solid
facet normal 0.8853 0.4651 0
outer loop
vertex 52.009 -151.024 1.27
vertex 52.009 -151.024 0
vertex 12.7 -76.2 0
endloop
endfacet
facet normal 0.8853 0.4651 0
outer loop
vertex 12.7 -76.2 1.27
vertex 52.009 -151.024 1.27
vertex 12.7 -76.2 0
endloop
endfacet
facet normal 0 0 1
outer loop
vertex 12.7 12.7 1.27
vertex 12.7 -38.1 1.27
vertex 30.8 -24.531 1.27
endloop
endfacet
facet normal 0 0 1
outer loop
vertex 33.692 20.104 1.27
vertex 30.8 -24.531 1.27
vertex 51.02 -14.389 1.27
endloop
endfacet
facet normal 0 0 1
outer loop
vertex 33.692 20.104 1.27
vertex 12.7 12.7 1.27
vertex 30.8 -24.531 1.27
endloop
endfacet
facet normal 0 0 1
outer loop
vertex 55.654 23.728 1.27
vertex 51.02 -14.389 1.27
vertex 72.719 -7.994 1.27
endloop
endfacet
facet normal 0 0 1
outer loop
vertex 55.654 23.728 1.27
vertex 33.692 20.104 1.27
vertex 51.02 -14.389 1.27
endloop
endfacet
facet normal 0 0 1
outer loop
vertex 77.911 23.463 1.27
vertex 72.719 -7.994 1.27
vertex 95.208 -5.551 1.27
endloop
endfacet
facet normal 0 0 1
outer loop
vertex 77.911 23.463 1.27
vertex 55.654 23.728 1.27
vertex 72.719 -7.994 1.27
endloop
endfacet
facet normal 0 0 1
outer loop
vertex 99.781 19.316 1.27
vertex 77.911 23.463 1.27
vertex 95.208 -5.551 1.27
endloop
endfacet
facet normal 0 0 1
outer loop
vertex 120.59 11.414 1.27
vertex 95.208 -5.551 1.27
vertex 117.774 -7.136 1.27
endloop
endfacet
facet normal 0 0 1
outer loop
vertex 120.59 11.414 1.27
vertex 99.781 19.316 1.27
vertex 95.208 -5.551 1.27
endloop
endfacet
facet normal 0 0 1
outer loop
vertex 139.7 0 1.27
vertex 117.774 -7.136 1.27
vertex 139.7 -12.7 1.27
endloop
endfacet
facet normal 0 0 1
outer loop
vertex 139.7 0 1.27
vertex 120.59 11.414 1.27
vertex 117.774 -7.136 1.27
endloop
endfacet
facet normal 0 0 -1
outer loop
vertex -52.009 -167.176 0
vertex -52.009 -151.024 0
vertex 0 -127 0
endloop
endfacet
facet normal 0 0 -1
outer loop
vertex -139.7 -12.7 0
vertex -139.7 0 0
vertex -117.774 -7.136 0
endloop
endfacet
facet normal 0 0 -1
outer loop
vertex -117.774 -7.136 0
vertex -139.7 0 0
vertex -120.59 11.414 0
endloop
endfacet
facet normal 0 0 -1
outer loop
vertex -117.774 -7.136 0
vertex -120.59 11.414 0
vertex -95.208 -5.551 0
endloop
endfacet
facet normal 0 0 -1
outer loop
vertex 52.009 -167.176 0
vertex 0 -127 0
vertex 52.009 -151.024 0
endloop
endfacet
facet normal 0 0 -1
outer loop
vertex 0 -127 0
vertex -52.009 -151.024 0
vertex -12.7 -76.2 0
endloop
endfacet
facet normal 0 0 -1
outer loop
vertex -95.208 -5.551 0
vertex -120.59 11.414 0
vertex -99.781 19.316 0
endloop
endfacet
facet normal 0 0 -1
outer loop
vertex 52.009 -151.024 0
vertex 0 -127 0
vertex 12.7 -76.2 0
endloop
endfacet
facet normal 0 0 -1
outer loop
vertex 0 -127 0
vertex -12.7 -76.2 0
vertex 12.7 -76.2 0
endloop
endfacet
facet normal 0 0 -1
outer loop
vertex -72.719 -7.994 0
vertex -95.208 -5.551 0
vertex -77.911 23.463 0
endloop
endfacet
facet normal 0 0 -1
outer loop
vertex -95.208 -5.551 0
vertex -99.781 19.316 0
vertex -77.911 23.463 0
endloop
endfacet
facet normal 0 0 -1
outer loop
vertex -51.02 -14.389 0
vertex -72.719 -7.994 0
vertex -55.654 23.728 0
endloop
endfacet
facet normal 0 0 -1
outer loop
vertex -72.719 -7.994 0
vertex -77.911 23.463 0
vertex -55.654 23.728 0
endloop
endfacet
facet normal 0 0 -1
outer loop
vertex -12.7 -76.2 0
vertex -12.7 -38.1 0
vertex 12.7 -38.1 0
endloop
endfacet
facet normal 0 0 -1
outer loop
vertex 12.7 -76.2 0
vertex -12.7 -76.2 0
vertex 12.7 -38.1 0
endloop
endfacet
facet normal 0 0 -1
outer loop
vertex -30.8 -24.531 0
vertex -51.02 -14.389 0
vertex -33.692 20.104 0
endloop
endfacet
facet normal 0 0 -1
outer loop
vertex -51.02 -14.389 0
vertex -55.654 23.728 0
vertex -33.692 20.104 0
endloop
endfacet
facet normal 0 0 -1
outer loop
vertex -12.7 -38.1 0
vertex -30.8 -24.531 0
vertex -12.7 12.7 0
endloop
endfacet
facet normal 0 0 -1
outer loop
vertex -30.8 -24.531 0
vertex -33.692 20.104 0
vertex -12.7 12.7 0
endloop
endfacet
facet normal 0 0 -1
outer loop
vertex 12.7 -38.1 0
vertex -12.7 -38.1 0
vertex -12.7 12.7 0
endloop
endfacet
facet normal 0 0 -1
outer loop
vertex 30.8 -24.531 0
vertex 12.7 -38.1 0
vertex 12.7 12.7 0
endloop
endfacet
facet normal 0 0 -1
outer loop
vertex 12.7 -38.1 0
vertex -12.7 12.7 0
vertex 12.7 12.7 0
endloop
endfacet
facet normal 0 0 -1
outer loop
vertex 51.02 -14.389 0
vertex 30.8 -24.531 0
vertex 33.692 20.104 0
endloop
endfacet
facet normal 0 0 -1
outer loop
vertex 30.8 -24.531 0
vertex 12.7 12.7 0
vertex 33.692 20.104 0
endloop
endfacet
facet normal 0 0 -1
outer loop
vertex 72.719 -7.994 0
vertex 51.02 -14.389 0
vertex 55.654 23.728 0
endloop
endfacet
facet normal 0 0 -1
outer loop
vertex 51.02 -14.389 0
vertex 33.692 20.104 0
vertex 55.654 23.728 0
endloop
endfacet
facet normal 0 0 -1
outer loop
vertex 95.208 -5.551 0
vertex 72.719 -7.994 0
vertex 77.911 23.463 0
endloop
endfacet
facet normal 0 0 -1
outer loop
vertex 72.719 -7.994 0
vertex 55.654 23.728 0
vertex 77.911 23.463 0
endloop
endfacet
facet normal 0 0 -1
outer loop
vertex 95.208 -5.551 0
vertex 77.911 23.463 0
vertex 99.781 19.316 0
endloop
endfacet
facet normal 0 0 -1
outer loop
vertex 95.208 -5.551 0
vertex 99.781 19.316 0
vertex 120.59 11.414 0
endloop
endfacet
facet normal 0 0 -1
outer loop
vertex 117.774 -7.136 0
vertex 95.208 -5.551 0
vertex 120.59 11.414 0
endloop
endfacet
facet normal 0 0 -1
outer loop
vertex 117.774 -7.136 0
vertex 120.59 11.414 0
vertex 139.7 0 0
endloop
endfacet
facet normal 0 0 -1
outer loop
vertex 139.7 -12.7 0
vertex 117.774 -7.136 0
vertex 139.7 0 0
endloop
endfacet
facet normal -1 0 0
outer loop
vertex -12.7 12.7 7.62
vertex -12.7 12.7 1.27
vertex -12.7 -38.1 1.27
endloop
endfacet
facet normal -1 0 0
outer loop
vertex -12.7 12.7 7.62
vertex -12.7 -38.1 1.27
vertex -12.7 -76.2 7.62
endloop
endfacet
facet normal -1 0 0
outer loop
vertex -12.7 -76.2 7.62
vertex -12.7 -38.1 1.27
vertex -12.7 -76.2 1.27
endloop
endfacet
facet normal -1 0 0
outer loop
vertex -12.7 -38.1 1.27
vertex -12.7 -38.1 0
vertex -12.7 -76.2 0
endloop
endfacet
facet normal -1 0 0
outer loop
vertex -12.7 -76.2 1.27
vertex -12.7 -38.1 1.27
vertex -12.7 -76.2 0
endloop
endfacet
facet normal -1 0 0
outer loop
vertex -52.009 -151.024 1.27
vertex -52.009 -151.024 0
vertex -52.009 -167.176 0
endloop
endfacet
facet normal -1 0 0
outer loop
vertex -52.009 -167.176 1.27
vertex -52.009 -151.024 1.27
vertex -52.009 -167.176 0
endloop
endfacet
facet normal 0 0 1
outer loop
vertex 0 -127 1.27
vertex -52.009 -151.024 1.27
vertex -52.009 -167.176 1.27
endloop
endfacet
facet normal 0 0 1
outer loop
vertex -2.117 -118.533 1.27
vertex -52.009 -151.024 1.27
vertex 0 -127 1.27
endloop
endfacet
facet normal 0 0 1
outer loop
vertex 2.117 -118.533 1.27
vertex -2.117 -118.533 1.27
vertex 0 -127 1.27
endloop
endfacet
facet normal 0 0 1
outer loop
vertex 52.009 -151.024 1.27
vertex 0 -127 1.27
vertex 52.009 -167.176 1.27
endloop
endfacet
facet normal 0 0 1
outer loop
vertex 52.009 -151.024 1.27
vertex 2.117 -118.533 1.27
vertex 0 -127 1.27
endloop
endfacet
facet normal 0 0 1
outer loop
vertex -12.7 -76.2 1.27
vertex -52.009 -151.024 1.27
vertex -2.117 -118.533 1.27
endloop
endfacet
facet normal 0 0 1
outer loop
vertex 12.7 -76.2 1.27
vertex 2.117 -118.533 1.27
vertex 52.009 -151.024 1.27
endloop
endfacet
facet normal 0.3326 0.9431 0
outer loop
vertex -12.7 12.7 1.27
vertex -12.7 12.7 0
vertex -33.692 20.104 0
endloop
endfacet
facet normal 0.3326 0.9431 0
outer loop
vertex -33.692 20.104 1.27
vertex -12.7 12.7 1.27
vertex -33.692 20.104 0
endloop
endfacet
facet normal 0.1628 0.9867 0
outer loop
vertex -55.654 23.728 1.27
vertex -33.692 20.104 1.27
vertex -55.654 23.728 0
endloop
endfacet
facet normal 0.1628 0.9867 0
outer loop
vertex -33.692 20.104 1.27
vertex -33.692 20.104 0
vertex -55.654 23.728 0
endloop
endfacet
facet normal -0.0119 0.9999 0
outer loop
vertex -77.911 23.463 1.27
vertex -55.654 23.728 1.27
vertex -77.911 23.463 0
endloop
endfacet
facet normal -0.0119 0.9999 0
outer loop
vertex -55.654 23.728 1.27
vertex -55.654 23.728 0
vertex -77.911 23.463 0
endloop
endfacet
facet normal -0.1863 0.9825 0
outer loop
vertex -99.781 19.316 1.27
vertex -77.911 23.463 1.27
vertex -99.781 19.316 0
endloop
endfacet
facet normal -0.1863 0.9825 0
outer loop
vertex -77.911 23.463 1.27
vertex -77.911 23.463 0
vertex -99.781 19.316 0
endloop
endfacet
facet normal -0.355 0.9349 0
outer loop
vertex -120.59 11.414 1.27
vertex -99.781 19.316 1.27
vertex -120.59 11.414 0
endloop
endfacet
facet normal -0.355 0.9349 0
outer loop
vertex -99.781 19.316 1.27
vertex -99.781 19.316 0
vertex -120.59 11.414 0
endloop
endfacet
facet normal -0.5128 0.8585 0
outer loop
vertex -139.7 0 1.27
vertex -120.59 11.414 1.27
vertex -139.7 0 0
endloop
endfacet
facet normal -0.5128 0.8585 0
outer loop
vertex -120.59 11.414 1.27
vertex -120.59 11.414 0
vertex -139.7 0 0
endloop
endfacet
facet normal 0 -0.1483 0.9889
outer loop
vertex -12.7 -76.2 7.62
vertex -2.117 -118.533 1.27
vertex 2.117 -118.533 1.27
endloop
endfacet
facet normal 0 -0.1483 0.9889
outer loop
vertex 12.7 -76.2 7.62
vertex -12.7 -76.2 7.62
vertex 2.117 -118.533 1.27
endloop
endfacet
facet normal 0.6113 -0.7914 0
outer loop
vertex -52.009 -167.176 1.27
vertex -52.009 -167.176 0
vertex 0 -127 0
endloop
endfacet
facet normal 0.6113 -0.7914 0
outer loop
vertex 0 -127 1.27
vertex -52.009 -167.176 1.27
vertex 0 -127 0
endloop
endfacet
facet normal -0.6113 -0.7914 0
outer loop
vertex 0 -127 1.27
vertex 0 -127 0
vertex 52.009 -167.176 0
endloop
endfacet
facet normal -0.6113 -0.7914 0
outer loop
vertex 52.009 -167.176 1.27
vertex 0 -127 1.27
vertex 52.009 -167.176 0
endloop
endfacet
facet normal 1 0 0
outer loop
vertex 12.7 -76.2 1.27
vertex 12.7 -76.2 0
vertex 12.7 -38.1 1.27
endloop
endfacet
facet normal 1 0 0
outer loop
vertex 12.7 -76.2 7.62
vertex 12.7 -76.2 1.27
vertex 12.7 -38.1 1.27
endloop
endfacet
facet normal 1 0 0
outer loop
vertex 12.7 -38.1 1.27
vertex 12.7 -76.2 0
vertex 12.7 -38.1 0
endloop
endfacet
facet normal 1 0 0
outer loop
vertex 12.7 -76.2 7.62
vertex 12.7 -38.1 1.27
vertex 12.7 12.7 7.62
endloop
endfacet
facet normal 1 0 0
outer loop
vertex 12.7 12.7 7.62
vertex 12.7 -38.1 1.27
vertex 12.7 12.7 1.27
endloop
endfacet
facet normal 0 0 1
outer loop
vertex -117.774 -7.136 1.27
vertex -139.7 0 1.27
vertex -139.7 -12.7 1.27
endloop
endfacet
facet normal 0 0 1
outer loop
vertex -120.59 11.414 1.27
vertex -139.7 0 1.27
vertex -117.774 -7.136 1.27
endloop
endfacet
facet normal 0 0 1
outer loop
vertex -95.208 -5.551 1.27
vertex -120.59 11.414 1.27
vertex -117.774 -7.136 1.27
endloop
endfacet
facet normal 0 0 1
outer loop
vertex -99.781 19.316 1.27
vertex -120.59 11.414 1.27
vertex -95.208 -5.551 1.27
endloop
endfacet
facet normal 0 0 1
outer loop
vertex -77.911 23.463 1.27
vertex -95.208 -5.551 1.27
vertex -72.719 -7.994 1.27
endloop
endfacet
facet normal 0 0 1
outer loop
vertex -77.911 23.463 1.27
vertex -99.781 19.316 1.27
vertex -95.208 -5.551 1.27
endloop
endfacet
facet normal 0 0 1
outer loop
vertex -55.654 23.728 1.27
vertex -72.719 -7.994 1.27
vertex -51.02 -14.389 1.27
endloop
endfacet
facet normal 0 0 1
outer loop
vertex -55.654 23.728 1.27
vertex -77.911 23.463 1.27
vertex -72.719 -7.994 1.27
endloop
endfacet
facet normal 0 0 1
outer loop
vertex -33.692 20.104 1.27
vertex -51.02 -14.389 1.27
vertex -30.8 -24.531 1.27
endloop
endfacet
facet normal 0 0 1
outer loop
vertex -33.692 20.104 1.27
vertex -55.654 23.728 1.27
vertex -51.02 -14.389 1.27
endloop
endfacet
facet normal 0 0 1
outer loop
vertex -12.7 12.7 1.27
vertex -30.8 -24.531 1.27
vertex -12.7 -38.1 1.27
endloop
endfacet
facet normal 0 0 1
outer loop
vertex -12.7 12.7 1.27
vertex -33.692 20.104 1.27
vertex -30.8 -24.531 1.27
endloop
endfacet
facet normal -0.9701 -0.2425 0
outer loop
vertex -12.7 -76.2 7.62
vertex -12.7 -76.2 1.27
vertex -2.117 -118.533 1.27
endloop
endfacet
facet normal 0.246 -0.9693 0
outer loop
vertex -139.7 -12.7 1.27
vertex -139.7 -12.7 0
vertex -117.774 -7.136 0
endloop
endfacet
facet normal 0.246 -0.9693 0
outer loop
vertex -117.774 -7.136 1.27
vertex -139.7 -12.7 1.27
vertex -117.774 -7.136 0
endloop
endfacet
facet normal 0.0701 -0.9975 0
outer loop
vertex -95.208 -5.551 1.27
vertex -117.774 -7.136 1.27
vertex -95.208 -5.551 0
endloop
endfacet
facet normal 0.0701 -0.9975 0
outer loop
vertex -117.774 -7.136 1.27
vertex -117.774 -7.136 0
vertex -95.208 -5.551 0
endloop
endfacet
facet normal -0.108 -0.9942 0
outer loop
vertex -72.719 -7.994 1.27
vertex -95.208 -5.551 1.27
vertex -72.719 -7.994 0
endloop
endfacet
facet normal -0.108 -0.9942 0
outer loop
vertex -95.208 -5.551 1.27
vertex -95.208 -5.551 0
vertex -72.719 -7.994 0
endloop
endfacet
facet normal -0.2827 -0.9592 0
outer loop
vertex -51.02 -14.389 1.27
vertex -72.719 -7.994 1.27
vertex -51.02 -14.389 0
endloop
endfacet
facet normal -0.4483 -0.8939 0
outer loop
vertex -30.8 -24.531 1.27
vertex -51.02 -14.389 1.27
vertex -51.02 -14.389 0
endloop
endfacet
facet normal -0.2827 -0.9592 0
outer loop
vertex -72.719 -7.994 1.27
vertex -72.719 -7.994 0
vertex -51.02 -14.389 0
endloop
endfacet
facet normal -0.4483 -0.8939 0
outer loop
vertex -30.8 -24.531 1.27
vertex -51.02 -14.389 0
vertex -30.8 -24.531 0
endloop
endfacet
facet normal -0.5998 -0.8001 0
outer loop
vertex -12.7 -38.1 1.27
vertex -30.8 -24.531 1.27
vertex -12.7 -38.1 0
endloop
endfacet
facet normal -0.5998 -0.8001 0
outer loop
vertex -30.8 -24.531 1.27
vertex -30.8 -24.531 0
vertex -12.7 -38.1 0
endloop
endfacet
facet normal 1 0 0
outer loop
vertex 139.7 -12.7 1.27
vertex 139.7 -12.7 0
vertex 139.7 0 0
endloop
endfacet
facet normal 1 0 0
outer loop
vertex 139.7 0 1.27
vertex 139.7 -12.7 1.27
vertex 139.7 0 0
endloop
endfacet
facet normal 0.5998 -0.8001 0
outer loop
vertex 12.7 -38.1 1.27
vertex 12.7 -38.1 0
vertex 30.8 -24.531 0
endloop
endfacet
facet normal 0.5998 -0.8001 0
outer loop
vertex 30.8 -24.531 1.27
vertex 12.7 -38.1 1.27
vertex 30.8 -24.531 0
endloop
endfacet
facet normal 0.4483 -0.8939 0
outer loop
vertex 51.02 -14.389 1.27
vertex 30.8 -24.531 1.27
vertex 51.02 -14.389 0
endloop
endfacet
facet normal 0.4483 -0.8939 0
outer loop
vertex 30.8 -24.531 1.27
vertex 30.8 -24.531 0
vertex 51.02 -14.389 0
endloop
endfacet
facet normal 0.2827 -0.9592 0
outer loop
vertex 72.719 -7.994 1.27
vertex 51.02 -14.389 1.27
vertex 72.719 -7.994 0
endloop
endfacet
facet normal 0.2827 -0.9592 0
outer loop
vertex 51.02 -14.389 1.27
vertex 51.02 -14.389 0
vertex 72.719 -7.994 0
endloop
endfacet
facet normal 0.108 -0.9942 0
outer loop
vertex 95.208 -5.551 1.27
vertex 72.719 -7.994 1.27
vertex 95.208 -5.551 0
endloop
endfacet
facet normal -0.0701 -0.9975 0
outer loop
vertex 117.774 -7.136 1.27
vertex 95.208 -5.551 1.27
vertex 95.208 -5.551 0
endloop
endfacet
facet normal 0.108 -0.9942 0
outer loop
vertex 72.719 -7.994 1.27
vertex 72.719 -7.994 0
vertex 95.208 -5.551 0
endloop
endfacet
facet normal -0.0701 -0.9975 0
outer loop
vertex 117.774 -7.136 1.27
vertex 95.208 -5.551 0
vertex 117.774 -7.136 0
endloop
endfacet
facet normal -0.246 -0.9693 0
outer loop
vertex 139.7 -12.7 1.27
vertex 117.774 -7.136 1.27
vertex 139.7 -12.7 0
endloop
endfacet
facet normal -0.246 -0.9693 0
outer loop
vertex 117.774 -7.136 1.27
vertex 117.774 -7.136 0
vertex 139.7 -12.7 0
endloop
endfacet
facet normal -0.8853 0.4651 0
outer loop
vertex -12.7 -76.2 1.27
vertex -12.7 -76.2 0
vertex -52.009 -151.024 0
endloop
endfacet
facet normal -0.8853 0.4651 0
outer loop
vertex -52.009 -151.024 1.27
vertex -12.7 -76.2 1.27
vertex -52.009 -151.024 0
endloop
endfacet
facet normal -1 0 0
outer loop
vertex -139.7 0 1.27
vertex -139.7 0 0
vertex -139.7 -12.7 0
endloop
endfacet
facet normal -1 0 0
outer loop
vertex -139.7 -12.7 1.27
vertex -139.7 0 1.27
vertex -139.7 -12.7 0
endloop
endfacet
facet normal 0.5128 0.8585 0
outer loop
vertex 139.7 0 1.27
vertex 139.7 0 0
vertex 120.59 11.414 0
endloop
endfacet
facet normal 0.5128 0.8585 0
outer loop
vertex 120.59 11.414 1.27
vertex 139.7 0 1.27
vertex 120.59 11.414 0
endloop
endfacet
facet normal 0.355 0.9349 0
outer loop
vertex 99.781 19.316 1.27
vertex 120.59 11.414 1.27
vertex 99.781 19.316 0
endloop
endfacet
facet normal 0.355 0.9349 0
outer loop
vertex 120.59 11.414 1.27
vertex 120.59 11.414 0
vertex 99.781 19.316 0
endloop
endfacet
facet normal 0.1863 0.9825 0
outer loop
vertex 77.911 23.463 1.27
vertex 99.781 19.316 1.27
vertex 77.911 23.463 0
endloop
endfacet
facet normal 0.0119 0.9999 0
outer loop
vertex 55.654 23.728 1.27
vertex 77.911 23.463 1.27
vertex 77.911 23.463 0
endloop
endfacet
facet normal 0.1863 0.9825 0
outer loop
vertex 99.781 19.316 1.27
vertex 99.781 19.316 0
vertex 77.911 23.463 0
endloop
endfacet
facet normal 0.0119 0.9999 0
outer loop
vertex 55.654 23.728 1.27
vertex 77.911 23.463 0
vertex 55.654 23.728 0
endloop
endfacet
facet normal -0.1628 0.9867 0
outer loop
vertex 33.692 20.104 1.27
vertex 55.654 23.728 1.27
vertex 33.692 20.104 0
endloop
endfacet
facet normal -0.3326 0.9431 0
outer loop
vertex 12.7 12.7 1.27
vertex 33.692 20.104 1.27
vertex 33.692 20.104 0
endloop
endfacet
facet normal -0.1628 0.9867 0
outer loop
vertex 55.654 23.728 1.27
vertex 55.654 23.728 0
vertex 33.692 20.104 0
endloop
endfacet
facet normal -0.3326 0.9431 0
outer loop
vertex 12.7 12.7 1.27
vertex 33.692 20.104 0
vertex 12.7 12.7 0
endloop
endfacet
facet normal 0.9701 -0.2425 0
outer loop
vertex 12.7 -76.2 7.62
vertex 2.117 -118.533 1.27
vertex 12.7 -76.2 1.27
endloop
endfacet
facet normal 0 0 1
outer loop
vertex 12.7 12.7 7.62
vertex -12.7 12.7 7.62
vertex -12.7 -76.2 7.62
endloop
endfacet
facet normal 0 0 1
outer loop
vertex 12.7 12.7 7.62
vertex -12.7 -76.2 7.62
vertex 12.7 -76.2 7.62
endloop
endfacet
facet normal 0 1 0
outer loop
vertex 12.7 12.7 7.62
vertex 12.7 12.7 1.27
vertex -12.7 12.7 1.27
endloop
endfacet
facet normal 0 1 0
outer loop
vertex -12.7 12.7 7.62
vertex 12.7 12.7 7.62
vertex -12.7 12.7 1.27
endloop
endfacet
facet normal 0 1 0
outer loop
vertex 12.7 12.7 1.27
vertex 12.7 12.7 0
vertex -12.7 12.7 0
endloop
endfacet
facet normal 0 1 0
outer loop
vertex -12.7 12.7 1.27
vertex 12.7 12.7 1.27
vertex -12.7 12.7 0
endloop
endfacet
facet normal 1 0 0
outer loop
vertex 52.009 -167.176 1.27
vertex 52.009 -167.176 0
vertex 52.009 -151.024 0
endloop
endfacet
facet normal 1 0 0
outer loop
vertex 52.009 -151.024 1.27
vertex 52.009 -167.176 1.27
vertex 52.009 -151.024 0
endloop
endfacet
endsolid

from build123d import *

# Parameters (mm, degrees)
F1_DEPTH = 7.62
F2_DEPTH = 1.27
F4_W     = 50.8
F4_H     = 19.067067
F6_W     = 59.465482
F6_H     = 29.439323
F9_DEPTH = 1.27


with BuildPart() as f1:
    # F0 (on Top) → F1 (new body)
    with BuildSketch(Plane.XY):
        Polygon((12.7, 12.7), (-12.7, 12.7), (-12.7, -38.1), (-12.7, -76.2), (12.7, -76.2), (12.7, -38.1), align=None)
        Polygon((12.7, -76.2), (-12.7, -76.2), (0, -127), align=None)
    extrude(amount=F1_DEPTH)

    # F0 (on Top) → F2 (join)
    with BuildSketch(Plane.XY):
        with BuildLine():
            ThreePointArc((139.7, 0), (77.911288, 23.462884), (12.7, 12.7))
            Line((12.7, 12.7), (12.7, -38.1))
            ThreePointArc((12.7, -38.1), (72.718847, -7.994233), (139.7, -12.7))
            Line((139.7, -12.7), (139.7, 0))
        make_face()
        with BuildLine():
            Line((-12.7, -38.1), (-12.7, 12.7))
            ThreePointArc((-12.7, 12.7), (-77.911288, 23.462884), (-139.7, 0))
            Line((-139.7, 0), (-139.7, -12.7))
            ThreePointArc((-139.7, -12.7), (-72.718847, -7.994233), (-12.7, -38.1))
        make_face()
    extrude(amount=F2_DEPTH)

    # F4 (on offset) → F7 section 0
    with BuildSketch(Plane.XZ.offset(76.2)):
        with Locations((0, 17.153533)):
            Rectangle(F4_W, F4_H)
    # F6 (on offset) → F7 section 1
    with BuildSketch(Plane.XZ.offset(127)):
        with Locations((0.102181, 14.719661)):
            Rectangle(F6_W, F6_H)
    loft(mode=Mode.SUBTRACT)

    # F0 (on Top) + F8 (on face) → F9 (join)
    with BuildSketch(Plane.XY):
        Polygon((12.7, -76.2), (-12.7, -76.2), (0, -127), align=None)
    with BuildSketch(Plane.XY):
        Polygon((0, -127), (-12.7, -76.2), (-52.008614, -151.024356), (-52.008614, -167.176113), align=None)
        Polygon((52.008614, -151.024356), (12.7, -76.2), (0, -127), (52.008614, -167.176113), align=None)
    extrude(amount=F9_DEPTH)


solid = f1.part
